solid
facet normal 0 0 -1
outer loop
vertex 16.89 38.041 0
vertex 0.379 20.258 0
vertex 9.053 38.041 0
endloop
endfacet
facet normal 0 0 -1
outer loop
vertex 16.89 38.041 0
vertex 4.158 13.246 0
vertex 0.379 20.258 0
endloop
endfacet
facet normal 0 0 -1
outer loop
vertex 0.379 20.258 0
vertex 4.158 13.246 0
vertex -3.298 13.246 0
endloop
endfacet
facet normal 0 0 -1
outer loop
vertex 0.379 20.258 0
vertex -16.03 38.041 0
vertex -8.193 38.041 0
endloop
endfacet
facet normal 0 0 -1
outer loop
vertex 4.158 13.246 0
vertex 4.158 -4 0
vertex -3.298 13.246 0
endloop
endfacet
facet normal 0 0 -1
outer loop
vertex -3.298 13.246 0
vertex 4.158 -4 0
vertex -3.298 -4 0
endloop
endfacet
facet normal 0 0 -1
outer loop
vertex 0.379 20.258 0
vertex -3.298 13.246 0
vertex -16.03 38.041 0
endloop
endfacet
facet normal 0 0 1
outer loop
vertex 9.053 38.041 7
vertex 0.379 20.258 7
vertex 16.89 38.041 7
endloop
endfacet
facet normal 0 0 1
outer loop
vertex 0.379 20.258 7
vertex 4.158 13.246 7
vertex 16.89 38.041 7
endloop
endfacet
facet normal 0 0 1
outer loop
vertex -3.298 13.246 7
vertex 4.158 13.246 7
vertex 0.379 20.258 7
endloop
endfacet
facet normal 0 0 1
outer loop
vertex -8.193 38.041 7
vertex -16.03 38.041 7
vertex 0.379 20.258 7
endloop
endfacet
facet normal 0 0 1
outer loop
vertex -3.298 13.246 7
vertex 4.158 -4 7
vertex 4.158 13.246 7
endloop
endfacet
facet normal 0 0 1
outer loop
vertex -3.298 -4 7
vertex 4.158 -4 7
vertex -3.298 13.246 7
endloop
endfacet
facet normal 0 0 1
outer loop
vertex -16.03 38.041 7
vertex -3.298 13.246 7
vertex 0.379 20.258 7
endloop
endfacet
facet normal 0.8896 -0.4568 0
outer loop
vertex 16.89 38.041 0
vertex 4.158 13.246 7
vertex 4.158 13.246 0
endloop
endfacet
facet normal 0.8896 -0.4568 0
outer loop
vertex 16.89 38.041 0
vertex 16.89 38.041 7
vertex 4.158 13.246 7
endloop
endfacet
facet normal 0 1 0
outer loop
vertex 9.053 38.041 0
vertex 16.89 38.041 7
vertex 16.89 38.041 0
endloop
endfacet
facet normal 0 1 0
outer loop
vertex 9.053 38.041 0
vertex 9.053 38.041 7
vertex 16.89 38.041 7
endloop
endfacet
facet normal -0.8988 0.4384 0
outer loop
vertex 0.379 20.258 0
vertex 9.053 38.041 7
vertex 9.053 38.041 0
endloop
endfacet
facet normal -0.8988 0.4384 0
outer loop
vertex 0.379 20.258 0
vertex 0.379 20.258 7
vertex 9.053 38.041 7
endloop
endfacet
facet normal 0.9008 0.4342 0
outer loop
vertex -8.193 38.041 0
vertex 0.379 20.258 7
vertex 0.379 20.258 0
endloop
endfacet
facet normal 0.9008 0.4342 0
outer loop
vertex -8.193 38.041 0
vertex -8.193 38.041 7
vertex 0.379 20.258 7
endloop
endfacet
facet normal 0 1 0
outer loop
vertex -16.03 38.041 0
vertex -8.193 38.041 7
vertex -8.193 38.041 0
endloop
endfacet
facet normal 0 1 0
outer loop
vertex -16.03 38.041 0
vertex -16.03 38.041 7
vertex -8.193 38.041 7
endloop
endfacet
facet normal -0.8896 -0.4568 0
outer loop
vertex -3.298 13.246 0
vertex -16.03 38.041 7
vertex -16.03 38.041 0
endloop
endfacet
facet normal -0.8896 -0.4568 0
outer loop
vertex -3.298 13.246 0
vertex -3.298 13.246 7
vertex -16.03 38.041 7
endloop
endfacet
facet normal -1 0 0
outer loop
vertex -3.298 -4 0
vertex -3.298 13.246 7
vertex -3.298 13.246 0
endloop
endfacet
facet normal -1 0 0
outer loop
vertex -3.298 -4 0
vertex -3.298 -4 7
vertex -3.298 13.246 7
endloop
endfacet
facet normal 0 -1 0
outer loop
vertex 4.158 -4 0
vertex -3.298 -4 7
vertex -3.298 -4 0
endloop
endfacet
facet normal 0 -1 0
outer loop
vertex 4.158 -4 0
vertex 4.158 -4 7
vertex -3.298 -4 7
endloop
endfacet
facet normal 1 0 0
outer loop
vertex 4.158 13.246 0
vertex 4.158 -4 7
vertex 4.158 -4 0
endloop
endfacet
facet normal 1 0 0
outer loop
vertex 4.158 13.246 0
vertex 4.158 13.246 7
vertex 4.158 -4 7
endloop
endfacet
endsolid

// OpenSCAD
// file: glyph.scad
// glyph — the shared geometry of every letter in the set. Defines named geometry
// only, so it renders nothing on its own; each letter part includes it and calls
// letter(). Every dimension lives in ../../lib/common.scad.
//
// A LETTER IS NOTHING BUT A LETTER. No plinth, no tongue, no tab — it is the
// bare glyph, and it attaches by standing in the deck groove and resting on the
// groove's floor. Anything else on it would be a distraction on a learning toy.
//
// It is a flat plate of one thickness, printed face-down: no overhang anywhere,
// no supports, and the face on the bed comes out smoothest.
//
// TWO TRAPS WITH text():
//
//  * A missing font FALLS BACK SILENTLY — no warning, no error, just different
//    letters. "Liberation Sans" was the first choice here because OpenSCAD
//    bundles it; on macOS the bundled faces are not registered with fontconfig,
//    so it rendered the fallback face instead and nothing said so. To check a
//    font resolved, render a string with it and with a deliberately bogus name
//    and compare bounding boxes: identical means it fell back.
//  * `size` is not the cap height in general. For Helvetica Bold they coincide
//    (size 44 -> 44.0 mm cap), which is why letter_size reads as a height.
//    Change the font and re-measure.

include <../../lib/common.scad>

// The letter's outline, upright in the XY plane, ready to be extruded along Z
// (which is the letter's thickness, and the print's build axis).
//
//   y = 0   is the deck surface
//   y < 0   is the part standing down inside the groove. It reaches letter_bury,
//           which is where the tapered groove closes to letter_t — NOT the
//           groove's floor. The letter wedges; it never bottoms out.
module glyph_2d(ch) {
    intersection() {
        translate([0, -letter_bury])
            scale([letter_condense, 1])
                text(ch, size = letter_size, font = letter_font,
                     halign = "center", valign = "baseline");
        // Trimmed flat at the baseline. Round letters (O, C, G, S) overshoot the
        // baseline by design, and a letter standing on a convex curve rocks —
        // there is nothing to stop it leaning. The trim costs nothing visible
        // and gives every letter a flat foot on the groove floor.
        translate([-200, -letter_bury]) square([400, 400]);
    }
}

// One letter, in its print orientation: lying on its face, thickness up Z.
module letter(ch) {
    linear_extrude(letter_t) glyph_2d(ch);
}

// Where that letter sits once it is dropped into a chassis, for fit checks.
module letter_fitted(ch) {
    translate([0, letter_t/2, body_top]) rotate([90, 0, 0]) letter(ch);
}
// main file
// letter Y — one part. See glyph.scad for the geometry and lib/common.scad for
// the dimensions. Prints lying on its face, exactly as exported: no supports.

include <glyph.scad>

letter("Y");
